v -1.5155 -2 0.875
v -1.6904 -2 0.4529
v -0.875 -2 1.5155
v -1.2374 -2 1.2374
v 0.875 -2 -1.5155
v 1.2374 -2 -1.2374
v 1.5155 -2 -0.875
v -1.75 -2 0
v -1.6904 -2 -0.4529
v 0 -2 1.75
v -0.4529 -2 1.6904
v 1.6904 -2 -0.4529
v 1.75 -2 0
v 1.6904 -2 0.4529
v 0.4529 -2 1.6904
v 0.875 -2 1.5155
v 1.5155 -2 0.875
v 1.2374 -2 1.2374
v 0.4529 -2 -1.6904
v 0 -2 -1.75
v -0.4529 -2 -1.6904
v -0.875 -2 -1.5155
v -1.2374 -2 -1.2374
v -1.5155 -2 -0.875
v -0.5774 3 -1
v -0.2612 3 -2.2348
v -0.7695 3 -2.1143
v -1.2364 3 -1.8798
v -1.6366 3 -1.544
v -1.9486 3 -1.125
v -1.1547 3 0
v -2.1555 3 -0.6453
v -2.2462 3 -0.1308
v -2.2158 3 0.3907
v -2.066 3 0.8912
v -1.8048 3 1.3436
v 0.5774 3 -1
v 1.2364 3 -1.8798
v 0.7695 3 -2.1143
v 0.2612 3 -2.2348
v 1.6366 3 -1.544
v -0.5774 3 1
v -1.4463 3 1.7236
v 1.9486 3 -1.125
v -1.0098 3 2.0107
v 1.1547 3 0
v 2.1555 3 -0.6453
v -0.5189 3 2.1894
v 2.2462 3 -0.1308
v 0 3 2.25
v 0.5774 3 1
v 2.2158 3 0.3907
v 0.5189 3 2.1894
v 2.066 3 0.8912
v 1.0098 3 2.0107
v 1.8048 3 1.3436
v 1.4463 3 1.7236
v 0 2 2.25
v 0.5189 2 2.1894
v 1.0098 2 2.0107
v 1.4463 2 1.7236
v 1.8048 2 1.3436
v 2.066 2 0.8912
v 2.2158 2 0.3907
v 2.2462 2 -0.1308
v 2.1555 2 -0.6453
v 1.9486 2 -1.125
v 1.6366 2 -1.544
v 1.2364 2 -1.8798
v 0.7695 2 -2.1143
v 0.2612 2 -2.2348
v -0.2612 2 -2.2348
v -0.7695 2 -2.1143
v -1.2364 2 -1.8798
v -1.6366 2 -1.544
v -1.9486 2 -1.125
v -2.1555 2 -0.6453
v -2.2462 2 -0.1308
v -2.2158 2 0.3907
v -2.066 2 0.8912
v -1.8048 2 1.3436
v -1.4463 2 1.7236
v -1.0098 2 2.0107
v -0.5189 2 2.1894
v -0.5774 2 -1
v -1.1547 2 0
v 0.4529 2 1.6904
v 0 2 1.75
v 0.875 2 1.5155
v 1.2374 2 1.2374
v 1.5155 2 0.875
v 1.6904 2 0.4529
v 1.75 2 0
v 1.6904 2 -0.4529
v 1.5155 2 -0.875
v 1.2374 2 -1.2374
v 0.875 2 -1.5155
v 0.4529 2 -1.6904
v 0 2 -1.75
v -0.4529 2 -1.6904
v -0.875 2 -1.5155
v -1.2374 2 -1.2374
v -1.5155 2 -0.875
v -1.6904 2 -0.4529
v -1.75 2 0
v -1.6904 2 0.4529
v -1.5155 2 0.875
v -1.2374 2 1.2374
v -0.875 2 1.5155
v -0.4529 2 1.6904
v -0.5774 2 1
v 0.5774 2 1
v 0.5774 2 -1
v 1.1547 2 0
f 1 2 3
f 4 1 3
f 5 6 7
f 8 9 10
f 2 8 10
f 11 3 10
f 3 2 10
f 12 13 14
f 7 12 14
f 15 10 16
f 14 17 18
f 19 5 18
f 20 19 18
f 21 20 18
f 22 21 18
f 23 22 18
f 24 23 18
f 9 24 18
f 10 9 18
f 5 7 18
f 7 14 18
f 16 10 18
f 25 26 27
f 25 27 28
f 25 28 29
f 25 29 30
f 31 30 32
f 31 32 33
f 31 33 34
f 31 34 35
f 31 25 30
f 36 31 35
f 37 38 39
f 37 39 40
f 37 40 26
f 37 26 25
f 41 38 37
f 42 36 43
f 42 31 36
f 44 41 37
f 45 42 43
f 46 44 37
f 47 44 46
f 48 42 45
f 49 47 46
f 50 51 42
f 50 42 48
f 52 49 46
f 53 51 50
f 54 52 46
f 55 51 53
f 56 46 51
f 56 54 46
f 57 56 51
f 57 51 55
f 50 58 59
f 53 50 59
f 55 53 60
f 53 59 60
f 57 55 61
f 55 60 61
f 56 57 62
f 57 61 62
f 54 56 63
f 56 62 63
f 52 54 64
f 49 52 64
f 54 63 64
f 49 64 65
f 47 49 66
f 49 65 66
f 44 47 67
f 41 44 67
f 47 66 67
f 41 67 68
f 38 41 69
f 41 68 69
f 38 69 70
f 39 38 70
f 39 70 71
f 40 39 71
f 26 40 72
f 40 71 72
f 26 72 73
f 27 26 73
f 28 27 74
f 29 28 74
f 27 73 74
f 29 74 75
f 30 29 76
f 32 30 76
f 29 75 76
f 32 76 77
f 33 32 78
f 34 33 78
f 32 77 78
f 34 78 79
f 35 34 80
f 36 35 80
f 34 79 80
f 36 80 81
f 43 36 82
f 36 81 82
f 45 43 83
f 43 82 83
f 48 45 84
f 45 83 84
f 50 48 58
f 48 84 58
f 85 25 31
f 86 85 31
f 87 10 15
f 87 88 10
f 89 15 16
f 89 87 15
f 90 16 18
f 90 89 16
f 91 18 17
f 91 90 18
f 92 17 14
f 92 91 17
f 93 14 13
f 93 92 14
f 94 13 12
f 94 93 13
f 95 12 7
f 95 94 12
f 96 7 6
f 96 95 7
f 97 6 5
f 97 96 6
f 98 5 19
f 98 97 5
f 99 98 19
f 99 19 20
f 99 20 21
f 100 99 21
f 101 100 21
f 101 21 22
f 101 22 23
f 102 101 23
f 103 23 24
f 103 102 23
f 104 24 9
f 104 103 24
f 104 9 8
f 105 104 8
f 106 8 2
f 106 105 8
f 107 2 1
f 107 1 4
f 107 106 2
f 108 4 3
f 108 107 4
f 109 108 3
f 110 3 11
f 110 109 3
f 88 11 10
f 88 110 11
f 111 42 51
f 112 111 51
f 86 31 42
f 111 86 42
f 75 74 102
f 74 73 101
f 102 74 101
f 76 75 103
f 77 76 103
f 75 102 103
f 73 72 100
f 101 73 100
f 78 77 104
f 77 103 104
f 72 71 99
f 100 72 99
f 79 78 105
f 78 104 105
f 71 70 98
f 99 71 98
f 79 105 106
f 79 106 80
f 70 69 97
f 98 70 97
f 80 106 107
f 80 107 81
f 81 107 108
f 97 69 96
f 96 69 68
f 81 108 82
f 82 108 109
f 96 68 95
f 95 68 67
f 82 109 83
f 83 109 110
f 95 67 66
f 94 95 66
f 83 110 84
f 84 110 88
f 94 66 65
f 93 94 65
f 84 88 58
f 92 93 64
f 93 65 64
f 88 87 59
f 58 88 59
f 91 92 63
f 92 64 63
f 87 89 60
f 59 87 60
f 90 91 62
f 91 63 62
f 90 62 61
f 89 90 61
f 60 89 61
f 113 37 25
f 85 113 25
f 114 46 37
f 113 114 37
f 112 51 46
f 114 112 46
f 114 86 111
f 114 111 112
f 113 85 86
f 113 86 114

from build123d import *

# Parameters (mm, degrees)
SKETCH1_R           = 1.75
BOSS_EXTRUDE1_DEPTH = 2
SKETCH2_R           = 2.25
BOSS_EXTRUDE2_DEPTH = 1
CUT_EXTRUDE1_DEPTH  = 1


with BuildPart() as part:
    # Sketch1 → Boss-Extrude1 (new, symmetric)
    with BuildSketch(Plane(origin=(0, 0, 0), x_dir=(1, 0, 0), z_dir=(0, 1, 0))):
        with Locations(Location((0, 0, 0), (0, 0, 270))):
            Circle(SKETCH1_R)
    extrude(amount=BOSS_EXTRUDE1_DEPTH, both=True)

    # Sketch2 → Boss-Extrude2 (add)
    with BuildSketch(Plane(origin=(0, 2, 0), x_dir=(1, 0, 0), z_dir=(0, 1, 0))):
        with Locations(Location((0, 0, 0), (0, 0, 270))):
            Circle(SKETCH2_R)
    extrude(amount=BOSS_EXTRUDE2_DEPTH)

    # Sketch3 → Cut-Extrude1 (cut)
    with BuildSketch(Plane(origin=(0, 3, 0), x_dir=(1, 0, 0), z_dir=(0, 1, 0))):
        Polygon((1.154700538, 0), (0.577350269, 1), (-0.577350269, 1), (-1.154700538, 0), (-0.577350269, -1), (0.577350269, -1), align=None)
    extrude(amount=-CUT_EXTRUDE1_DEPTH, mode=Mode.SUBTRACT)


solid = part.part
